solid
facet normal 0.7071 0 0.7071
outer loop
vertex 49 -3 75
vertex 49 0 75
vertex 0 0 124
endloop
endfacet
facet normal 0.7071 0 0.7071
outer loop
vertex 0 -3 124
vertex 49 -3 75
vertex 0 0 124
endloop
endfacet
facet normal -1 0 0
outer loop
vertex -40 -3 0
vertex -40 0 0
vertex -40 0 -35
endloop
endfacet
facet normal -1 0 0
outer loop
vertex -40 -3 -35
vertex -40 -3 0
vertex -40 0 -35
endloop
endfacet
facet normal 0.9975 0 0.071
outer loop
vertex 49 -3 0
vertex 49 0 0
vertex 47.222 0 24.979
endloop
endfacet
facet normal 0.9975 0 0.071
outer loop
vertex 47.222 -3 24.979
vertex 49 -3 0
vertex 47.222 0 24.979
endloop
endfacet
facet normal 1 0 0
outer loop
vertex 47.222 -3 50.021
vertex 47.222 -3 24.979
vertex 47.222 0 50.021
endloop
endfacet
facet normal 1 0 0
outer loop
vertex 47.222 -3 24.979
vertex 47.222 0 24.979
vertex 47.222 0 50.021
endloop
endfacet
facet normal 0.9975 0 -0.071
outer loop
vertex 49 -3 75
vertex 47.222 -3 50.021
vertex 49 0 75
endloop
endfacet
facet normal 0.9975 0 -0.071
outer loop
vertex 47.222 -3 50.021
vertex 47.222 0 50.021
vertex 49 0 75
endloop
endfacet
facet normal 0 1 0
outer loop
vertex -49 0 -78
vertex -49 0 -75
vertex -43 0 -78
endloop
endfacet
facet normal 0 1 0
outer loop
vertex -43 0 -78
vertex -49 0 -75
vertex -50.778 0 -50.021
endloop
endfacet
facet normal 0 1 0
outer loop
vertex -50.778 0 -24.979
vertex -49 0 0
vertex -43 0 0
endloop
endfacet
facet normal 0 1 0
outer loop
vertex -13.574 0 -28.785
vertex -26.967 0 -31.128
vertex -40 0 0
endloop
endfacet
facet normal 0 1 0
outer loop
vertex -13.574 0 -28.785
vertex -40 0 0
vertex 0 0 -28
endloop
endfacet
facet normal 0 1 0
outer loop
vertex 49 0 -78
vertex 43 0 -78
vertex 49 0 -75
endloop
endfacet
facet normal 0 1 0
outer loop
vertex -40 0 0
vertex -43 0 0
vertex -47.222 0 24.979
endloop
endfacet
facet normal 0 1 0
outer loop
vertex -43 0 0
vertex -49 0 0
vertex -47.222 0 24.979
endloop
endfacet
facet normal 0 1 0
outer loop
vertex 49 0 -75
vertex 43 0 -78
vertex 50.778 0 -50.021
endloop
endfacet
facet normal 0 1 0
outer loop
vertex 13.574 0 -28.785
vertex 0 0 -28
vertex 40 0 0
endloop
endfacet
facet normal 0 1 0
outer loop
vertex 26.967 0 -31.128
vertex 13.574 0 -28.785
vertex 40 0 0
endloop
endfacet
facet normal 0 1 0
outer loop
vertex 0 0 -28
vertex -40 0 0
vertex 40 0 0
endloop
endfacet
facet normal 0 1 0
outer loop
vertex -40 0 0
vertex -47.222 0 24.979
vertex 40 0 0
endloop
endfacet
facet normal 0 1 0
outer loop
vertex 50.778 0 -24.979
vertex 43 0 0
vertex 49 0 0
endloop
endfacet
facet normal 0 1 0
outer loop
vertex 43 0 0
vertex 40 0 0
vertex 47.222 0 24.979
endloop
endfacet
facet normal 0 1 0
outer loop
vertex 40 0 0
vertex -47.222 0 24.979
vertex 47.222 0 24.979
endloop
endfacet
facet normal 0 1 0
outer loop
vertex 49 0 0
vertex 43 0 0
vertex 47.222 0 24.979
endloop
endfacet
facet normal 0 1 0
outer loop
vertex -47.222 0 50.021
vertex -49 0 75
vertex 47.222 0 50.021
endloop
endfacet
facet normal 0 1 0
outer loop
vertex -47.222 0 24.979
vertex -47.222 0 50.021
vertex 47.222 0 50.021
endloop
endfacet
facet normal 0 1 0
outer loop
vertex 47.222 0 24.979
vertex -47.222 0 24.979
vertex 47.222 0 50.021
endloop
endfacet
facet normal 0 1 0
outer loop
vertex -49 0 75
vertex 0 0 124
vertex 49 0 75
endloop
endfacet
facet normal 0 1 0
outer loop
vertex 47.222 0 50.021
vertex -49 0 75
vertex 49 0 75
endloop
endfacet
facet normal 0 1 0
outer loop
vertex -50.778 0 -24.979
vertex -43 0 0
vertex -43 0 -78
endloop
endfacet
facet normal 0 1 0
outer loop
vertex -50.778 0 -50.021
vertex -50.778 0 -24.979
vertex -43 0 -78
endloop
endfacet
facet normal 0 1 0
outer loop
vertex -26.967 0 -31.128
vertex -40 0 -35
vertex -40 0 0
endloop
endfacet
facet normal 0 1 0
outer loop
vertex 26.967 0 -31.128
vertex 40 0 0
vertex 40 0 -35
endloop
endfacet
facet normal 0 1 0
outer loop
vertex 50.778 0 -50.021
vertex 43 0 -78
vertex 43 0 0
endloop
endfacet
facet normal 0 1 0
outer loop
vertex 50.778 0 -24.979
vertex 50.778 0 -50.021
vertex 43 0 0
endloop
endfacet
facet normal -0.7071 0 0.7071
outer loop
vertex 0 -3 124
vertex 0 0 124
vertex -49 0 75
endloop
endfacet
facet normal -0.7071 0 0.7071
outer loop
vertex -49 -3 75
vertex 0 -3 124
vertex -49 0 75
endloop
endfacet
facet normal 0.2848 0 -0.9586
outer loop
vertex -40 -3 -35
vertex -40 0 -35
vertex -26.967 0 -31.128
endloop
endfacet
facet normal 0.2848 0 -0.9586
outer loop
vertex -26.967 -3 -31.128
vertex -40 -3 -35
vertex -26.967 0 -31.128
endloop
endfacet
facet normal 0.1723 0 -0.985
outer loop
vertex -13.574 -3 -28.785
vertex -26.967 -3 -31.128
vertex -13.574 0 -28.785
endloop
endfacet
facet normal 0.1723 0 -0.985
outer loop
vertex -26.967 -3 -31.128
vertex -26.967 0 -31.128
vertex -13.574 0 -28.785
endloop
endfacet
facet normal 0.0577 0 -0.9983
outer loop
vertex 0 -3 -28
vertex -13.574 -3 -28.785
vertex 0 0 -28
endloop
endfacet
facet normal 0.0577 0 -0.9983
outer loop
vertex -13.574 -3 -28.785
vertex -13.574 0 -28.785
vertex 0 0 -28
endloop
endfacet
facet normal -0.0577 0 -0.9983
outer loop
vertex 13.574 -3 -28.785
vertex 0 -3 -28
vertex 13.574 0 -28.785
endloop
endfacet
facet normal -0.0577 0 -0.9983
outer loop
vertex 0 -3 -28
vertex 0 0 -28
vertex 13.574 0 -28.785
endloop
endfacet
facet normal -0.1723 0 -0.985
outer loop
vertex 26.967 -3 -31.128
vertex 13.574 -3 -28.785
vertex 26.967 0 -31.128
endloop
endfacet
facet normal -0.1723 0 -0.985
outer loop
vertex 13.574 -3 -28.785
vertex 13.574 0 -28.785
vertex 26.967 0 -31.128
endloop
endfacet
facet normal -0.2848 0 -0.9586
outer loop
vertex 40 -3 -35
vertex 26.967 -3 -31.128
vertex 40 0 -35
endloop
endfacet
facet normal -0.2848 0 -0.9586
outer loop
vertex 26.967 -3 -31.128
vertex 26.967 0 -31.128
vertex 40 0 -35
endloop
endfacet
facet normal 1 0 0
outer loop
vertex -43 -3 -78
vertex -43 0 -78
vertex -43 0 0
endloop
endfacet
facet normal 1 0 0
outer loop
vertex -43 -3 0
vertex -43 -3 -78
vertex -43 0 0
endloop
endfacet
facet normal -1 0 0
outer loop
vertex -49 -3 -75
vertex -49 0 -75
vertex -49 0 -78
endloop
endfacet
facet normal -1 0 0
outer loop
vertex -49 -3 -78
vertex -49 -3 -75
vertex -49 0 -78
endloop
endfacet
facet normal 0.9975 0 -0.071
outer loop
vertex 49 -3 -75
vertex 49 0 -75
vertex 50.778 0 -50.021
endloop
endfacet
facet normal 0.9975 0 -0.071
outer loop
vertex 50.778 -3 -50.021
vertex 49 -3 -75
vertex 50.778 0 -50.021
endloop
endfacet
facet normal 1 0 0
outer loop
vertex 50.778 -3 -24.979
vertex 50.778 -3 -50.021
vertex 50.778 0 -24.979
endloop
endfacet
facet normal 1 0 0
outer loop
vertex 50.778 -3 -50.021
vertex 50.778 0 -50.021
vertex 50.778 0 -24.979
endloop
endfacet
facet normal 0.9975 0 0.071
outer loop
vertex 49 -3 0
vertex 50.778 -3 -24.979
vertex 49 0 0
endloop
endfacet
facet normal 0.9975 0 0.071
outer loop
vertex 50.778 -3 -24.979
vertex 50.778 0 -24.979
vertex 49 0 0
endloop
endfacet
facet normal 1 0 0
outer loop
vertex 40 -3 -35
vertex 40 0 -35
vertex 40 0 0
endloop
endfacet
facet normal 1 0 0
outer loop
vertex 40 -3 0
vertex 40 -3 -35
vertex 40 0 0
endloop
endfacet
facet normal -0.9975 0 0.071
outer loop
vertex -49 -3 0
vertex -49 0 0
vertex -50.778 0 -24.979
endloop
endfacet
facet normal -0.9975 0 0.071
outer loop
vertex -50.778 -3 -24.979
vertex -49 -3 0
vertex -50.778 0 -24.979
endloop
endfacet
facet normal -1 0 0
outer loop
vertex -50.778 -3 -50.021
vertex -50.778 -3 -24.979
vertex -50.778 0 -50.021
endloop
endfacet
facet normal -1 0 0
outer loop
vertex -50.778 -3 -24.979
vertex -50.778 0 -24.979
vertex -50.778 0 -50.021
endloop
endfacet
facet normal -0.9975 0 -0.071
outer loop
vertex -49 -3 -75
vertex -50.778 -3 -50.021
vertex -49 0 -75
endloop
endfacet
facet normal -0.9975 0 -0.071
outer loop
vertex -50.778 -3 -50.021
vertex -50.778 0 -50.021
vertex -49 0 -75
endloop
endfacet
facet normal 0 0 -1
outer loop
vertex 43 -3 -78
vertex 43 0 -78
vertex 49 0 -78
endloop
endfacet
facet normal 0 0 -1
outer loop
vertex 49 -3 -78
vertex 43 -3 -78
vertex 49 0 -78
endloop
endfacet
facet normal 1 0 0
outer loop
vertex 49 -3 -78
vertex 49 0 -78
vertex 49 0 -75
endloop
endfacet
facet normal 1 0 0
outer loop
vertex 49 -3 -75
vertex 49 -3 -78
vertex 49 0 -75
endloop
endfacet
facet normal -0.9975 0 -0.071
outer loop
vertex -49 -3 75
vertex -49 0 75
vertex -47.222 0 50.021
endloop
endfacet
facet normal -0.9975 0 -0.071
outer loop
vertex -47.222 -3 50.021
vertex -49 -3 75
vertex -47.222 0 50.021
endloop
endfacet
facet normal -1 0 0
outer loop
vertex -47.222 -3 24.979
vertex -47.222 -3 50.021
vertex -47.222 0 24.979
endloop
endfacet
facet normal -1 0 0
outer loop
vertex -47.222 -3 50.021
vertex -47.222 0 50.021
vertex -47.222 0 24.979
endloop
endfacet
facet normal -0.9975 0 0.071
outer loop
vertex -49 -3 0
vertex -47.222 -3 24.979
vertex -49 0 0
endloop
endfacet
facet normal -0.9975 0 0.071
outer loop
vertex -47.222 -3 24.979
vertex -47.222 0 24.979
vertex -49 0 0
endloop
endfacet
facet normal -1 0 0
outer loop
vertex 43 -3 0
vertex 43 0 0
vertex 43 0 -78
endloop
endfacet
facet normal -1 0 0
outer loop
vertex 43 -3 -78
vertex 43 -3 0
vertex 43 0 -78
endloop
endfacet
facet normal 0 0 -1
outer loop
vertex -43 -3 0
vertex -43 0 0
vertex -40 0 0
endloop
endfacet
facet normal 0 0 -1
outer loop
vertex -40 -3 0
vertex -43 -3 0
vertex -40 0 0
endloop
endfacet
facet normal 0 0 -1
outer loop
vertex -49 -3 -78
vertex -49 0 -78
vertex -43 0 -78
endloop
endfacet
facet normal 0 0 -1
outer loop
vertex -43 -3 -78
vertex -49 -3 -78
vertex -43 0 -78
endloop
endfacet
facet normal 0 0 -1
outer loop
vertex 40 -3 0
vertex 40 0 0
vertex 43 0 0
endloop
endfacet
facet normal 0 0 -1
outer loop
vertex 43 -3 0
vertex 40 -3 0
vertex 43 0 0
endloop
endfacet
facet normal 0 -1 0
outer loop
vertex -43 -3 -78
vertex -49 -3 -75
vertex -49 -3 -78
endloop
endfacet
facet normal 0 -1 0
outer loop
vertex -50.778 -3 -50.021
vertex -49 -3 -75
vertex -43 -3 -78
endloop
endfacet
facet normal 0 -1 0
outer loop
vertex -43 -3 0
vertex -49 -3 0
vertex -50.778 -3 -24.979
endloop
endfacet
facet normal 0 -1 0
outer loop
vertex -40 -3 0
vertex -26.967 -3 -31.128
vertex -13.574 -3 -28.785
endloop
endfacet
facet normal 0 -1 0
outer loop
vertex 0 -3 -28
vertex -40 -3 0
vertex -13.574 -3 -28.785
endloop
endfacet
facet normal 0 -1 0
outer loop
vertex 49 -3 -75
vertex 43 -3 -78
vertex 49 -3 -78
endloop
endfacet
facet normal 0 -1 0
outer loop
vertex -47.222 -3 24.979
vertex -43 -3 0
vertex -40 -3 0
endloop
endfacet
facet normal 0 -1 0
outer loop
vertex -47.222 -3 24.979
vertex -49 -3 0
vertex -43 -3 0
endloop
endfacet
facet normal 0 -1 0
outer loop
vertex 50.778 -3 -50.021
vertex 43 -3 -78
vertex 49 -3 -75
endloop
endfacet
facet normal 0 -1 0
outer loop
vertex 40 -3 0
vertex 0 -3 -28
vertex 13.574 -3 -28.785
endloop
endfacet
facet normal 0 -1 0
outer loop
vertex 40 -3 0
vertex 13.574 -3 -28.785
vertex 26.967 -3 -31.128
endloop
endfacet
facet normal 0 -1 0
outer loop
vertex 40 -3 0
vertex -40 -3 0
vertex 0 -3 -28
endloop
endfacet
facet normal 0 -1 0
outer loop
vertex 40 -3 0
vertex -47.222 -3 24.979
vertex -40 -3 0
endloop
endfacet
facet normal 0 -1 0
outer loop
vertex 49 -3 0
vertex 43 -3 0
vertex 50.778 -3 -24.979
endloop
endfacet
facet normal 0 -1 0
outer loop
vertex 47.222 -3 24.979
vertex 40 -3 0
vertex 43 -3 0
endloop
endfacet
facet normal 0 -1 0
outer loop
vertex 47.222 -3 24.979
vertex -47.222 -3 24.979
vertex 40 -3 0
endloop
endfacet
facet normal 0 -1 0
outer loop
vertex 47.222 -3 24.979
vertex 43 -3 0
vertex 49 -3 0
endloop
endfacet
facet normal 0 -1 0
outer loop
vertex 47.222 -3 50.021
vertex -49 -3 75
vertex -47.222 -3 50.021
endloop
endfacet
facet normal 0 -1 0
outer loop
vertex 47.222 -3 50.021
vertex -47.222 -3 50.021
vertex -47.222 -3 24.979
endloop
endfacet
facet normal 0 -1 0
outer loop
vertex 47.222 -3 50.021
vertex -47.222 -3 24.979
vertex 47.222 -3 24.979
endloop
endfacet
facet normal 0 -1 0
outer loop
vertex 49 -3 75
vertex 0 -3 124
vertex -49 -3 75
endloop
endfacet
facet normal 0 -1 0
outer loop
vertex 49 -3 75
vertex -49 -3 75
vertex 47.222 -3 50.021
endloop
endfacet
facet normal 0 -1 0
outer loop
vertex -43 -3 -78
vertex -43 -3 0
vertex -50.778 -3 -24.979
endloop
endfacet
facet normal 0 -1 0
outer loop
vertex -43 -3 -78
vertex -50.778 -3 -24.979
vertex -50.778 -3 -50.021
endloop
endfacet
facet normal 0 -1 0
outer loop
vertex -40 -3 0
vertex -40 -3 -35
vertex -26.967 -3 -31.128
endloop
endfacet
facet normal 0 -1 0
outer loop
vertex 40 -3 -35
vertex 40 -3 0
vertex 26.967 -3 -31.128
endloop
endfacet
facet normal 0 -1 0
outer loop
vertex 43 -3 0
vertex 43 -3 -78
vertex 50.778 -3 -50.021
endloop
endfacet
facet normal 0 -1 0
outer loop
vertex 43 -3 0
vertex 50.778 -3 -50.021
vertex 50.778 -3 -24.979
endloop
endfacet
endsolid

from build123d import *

# Parameters (mm, degrees)
F1_W     = 6
F1_H     = 3
F2_DEPTH = 3


with BuildPart() as f2:
    # F1 (on Front) → F2 (new body)
    with BuildSketch(Plane.XZ):
        Polygon((-49, 75), (49, 75), (0, 124), align=None)
        with BuildLine():
            Line((43, -75), (49, -75))
            Line((49, -75), (49, 0))
            ThreePointArc((49, 0), (47, 37.5), (49, 75))
            Line((49, 75), (-49, 75))
            ThreePointArc((-49, 75), (-47, 37.5), (-49, 0))
            Line((-49, 0), (-49, -75))
            Line((-49, -75), (-43, -75))
            Line((-43, -75), (-43, 0))
            Line((-43, 0), (-40, 0))
            Line((-40, 0), (-40, -35))
            ThreePointArc((-40, -35), (0, -28), (40, -35))
            Line((40, -35), (40, 0))
            Line((40, 0), (43, 0))
            Line((43, 0), (43, -75))
        make_face()
        with Locations((-46, -76.5)):
            Rectangle(F1_W, F1_H)
        with Locations((46, -76.5)):
            Rectangle(F1_W, F1_H)
        with BuildLine():
            Line((-49, -75), (-49, 0))
            ThreePointArc((-49, 0), (-51, -37.5), (-49, -75))
        make_face()
        with BuildLine():
            Line((49, 0), (49, -75))
            ThreePointArc((49, -75), (51, -37.5), (49, 0))
        make_face()
    extrude(amount=F2_DEPTH)


solid = f2.part
